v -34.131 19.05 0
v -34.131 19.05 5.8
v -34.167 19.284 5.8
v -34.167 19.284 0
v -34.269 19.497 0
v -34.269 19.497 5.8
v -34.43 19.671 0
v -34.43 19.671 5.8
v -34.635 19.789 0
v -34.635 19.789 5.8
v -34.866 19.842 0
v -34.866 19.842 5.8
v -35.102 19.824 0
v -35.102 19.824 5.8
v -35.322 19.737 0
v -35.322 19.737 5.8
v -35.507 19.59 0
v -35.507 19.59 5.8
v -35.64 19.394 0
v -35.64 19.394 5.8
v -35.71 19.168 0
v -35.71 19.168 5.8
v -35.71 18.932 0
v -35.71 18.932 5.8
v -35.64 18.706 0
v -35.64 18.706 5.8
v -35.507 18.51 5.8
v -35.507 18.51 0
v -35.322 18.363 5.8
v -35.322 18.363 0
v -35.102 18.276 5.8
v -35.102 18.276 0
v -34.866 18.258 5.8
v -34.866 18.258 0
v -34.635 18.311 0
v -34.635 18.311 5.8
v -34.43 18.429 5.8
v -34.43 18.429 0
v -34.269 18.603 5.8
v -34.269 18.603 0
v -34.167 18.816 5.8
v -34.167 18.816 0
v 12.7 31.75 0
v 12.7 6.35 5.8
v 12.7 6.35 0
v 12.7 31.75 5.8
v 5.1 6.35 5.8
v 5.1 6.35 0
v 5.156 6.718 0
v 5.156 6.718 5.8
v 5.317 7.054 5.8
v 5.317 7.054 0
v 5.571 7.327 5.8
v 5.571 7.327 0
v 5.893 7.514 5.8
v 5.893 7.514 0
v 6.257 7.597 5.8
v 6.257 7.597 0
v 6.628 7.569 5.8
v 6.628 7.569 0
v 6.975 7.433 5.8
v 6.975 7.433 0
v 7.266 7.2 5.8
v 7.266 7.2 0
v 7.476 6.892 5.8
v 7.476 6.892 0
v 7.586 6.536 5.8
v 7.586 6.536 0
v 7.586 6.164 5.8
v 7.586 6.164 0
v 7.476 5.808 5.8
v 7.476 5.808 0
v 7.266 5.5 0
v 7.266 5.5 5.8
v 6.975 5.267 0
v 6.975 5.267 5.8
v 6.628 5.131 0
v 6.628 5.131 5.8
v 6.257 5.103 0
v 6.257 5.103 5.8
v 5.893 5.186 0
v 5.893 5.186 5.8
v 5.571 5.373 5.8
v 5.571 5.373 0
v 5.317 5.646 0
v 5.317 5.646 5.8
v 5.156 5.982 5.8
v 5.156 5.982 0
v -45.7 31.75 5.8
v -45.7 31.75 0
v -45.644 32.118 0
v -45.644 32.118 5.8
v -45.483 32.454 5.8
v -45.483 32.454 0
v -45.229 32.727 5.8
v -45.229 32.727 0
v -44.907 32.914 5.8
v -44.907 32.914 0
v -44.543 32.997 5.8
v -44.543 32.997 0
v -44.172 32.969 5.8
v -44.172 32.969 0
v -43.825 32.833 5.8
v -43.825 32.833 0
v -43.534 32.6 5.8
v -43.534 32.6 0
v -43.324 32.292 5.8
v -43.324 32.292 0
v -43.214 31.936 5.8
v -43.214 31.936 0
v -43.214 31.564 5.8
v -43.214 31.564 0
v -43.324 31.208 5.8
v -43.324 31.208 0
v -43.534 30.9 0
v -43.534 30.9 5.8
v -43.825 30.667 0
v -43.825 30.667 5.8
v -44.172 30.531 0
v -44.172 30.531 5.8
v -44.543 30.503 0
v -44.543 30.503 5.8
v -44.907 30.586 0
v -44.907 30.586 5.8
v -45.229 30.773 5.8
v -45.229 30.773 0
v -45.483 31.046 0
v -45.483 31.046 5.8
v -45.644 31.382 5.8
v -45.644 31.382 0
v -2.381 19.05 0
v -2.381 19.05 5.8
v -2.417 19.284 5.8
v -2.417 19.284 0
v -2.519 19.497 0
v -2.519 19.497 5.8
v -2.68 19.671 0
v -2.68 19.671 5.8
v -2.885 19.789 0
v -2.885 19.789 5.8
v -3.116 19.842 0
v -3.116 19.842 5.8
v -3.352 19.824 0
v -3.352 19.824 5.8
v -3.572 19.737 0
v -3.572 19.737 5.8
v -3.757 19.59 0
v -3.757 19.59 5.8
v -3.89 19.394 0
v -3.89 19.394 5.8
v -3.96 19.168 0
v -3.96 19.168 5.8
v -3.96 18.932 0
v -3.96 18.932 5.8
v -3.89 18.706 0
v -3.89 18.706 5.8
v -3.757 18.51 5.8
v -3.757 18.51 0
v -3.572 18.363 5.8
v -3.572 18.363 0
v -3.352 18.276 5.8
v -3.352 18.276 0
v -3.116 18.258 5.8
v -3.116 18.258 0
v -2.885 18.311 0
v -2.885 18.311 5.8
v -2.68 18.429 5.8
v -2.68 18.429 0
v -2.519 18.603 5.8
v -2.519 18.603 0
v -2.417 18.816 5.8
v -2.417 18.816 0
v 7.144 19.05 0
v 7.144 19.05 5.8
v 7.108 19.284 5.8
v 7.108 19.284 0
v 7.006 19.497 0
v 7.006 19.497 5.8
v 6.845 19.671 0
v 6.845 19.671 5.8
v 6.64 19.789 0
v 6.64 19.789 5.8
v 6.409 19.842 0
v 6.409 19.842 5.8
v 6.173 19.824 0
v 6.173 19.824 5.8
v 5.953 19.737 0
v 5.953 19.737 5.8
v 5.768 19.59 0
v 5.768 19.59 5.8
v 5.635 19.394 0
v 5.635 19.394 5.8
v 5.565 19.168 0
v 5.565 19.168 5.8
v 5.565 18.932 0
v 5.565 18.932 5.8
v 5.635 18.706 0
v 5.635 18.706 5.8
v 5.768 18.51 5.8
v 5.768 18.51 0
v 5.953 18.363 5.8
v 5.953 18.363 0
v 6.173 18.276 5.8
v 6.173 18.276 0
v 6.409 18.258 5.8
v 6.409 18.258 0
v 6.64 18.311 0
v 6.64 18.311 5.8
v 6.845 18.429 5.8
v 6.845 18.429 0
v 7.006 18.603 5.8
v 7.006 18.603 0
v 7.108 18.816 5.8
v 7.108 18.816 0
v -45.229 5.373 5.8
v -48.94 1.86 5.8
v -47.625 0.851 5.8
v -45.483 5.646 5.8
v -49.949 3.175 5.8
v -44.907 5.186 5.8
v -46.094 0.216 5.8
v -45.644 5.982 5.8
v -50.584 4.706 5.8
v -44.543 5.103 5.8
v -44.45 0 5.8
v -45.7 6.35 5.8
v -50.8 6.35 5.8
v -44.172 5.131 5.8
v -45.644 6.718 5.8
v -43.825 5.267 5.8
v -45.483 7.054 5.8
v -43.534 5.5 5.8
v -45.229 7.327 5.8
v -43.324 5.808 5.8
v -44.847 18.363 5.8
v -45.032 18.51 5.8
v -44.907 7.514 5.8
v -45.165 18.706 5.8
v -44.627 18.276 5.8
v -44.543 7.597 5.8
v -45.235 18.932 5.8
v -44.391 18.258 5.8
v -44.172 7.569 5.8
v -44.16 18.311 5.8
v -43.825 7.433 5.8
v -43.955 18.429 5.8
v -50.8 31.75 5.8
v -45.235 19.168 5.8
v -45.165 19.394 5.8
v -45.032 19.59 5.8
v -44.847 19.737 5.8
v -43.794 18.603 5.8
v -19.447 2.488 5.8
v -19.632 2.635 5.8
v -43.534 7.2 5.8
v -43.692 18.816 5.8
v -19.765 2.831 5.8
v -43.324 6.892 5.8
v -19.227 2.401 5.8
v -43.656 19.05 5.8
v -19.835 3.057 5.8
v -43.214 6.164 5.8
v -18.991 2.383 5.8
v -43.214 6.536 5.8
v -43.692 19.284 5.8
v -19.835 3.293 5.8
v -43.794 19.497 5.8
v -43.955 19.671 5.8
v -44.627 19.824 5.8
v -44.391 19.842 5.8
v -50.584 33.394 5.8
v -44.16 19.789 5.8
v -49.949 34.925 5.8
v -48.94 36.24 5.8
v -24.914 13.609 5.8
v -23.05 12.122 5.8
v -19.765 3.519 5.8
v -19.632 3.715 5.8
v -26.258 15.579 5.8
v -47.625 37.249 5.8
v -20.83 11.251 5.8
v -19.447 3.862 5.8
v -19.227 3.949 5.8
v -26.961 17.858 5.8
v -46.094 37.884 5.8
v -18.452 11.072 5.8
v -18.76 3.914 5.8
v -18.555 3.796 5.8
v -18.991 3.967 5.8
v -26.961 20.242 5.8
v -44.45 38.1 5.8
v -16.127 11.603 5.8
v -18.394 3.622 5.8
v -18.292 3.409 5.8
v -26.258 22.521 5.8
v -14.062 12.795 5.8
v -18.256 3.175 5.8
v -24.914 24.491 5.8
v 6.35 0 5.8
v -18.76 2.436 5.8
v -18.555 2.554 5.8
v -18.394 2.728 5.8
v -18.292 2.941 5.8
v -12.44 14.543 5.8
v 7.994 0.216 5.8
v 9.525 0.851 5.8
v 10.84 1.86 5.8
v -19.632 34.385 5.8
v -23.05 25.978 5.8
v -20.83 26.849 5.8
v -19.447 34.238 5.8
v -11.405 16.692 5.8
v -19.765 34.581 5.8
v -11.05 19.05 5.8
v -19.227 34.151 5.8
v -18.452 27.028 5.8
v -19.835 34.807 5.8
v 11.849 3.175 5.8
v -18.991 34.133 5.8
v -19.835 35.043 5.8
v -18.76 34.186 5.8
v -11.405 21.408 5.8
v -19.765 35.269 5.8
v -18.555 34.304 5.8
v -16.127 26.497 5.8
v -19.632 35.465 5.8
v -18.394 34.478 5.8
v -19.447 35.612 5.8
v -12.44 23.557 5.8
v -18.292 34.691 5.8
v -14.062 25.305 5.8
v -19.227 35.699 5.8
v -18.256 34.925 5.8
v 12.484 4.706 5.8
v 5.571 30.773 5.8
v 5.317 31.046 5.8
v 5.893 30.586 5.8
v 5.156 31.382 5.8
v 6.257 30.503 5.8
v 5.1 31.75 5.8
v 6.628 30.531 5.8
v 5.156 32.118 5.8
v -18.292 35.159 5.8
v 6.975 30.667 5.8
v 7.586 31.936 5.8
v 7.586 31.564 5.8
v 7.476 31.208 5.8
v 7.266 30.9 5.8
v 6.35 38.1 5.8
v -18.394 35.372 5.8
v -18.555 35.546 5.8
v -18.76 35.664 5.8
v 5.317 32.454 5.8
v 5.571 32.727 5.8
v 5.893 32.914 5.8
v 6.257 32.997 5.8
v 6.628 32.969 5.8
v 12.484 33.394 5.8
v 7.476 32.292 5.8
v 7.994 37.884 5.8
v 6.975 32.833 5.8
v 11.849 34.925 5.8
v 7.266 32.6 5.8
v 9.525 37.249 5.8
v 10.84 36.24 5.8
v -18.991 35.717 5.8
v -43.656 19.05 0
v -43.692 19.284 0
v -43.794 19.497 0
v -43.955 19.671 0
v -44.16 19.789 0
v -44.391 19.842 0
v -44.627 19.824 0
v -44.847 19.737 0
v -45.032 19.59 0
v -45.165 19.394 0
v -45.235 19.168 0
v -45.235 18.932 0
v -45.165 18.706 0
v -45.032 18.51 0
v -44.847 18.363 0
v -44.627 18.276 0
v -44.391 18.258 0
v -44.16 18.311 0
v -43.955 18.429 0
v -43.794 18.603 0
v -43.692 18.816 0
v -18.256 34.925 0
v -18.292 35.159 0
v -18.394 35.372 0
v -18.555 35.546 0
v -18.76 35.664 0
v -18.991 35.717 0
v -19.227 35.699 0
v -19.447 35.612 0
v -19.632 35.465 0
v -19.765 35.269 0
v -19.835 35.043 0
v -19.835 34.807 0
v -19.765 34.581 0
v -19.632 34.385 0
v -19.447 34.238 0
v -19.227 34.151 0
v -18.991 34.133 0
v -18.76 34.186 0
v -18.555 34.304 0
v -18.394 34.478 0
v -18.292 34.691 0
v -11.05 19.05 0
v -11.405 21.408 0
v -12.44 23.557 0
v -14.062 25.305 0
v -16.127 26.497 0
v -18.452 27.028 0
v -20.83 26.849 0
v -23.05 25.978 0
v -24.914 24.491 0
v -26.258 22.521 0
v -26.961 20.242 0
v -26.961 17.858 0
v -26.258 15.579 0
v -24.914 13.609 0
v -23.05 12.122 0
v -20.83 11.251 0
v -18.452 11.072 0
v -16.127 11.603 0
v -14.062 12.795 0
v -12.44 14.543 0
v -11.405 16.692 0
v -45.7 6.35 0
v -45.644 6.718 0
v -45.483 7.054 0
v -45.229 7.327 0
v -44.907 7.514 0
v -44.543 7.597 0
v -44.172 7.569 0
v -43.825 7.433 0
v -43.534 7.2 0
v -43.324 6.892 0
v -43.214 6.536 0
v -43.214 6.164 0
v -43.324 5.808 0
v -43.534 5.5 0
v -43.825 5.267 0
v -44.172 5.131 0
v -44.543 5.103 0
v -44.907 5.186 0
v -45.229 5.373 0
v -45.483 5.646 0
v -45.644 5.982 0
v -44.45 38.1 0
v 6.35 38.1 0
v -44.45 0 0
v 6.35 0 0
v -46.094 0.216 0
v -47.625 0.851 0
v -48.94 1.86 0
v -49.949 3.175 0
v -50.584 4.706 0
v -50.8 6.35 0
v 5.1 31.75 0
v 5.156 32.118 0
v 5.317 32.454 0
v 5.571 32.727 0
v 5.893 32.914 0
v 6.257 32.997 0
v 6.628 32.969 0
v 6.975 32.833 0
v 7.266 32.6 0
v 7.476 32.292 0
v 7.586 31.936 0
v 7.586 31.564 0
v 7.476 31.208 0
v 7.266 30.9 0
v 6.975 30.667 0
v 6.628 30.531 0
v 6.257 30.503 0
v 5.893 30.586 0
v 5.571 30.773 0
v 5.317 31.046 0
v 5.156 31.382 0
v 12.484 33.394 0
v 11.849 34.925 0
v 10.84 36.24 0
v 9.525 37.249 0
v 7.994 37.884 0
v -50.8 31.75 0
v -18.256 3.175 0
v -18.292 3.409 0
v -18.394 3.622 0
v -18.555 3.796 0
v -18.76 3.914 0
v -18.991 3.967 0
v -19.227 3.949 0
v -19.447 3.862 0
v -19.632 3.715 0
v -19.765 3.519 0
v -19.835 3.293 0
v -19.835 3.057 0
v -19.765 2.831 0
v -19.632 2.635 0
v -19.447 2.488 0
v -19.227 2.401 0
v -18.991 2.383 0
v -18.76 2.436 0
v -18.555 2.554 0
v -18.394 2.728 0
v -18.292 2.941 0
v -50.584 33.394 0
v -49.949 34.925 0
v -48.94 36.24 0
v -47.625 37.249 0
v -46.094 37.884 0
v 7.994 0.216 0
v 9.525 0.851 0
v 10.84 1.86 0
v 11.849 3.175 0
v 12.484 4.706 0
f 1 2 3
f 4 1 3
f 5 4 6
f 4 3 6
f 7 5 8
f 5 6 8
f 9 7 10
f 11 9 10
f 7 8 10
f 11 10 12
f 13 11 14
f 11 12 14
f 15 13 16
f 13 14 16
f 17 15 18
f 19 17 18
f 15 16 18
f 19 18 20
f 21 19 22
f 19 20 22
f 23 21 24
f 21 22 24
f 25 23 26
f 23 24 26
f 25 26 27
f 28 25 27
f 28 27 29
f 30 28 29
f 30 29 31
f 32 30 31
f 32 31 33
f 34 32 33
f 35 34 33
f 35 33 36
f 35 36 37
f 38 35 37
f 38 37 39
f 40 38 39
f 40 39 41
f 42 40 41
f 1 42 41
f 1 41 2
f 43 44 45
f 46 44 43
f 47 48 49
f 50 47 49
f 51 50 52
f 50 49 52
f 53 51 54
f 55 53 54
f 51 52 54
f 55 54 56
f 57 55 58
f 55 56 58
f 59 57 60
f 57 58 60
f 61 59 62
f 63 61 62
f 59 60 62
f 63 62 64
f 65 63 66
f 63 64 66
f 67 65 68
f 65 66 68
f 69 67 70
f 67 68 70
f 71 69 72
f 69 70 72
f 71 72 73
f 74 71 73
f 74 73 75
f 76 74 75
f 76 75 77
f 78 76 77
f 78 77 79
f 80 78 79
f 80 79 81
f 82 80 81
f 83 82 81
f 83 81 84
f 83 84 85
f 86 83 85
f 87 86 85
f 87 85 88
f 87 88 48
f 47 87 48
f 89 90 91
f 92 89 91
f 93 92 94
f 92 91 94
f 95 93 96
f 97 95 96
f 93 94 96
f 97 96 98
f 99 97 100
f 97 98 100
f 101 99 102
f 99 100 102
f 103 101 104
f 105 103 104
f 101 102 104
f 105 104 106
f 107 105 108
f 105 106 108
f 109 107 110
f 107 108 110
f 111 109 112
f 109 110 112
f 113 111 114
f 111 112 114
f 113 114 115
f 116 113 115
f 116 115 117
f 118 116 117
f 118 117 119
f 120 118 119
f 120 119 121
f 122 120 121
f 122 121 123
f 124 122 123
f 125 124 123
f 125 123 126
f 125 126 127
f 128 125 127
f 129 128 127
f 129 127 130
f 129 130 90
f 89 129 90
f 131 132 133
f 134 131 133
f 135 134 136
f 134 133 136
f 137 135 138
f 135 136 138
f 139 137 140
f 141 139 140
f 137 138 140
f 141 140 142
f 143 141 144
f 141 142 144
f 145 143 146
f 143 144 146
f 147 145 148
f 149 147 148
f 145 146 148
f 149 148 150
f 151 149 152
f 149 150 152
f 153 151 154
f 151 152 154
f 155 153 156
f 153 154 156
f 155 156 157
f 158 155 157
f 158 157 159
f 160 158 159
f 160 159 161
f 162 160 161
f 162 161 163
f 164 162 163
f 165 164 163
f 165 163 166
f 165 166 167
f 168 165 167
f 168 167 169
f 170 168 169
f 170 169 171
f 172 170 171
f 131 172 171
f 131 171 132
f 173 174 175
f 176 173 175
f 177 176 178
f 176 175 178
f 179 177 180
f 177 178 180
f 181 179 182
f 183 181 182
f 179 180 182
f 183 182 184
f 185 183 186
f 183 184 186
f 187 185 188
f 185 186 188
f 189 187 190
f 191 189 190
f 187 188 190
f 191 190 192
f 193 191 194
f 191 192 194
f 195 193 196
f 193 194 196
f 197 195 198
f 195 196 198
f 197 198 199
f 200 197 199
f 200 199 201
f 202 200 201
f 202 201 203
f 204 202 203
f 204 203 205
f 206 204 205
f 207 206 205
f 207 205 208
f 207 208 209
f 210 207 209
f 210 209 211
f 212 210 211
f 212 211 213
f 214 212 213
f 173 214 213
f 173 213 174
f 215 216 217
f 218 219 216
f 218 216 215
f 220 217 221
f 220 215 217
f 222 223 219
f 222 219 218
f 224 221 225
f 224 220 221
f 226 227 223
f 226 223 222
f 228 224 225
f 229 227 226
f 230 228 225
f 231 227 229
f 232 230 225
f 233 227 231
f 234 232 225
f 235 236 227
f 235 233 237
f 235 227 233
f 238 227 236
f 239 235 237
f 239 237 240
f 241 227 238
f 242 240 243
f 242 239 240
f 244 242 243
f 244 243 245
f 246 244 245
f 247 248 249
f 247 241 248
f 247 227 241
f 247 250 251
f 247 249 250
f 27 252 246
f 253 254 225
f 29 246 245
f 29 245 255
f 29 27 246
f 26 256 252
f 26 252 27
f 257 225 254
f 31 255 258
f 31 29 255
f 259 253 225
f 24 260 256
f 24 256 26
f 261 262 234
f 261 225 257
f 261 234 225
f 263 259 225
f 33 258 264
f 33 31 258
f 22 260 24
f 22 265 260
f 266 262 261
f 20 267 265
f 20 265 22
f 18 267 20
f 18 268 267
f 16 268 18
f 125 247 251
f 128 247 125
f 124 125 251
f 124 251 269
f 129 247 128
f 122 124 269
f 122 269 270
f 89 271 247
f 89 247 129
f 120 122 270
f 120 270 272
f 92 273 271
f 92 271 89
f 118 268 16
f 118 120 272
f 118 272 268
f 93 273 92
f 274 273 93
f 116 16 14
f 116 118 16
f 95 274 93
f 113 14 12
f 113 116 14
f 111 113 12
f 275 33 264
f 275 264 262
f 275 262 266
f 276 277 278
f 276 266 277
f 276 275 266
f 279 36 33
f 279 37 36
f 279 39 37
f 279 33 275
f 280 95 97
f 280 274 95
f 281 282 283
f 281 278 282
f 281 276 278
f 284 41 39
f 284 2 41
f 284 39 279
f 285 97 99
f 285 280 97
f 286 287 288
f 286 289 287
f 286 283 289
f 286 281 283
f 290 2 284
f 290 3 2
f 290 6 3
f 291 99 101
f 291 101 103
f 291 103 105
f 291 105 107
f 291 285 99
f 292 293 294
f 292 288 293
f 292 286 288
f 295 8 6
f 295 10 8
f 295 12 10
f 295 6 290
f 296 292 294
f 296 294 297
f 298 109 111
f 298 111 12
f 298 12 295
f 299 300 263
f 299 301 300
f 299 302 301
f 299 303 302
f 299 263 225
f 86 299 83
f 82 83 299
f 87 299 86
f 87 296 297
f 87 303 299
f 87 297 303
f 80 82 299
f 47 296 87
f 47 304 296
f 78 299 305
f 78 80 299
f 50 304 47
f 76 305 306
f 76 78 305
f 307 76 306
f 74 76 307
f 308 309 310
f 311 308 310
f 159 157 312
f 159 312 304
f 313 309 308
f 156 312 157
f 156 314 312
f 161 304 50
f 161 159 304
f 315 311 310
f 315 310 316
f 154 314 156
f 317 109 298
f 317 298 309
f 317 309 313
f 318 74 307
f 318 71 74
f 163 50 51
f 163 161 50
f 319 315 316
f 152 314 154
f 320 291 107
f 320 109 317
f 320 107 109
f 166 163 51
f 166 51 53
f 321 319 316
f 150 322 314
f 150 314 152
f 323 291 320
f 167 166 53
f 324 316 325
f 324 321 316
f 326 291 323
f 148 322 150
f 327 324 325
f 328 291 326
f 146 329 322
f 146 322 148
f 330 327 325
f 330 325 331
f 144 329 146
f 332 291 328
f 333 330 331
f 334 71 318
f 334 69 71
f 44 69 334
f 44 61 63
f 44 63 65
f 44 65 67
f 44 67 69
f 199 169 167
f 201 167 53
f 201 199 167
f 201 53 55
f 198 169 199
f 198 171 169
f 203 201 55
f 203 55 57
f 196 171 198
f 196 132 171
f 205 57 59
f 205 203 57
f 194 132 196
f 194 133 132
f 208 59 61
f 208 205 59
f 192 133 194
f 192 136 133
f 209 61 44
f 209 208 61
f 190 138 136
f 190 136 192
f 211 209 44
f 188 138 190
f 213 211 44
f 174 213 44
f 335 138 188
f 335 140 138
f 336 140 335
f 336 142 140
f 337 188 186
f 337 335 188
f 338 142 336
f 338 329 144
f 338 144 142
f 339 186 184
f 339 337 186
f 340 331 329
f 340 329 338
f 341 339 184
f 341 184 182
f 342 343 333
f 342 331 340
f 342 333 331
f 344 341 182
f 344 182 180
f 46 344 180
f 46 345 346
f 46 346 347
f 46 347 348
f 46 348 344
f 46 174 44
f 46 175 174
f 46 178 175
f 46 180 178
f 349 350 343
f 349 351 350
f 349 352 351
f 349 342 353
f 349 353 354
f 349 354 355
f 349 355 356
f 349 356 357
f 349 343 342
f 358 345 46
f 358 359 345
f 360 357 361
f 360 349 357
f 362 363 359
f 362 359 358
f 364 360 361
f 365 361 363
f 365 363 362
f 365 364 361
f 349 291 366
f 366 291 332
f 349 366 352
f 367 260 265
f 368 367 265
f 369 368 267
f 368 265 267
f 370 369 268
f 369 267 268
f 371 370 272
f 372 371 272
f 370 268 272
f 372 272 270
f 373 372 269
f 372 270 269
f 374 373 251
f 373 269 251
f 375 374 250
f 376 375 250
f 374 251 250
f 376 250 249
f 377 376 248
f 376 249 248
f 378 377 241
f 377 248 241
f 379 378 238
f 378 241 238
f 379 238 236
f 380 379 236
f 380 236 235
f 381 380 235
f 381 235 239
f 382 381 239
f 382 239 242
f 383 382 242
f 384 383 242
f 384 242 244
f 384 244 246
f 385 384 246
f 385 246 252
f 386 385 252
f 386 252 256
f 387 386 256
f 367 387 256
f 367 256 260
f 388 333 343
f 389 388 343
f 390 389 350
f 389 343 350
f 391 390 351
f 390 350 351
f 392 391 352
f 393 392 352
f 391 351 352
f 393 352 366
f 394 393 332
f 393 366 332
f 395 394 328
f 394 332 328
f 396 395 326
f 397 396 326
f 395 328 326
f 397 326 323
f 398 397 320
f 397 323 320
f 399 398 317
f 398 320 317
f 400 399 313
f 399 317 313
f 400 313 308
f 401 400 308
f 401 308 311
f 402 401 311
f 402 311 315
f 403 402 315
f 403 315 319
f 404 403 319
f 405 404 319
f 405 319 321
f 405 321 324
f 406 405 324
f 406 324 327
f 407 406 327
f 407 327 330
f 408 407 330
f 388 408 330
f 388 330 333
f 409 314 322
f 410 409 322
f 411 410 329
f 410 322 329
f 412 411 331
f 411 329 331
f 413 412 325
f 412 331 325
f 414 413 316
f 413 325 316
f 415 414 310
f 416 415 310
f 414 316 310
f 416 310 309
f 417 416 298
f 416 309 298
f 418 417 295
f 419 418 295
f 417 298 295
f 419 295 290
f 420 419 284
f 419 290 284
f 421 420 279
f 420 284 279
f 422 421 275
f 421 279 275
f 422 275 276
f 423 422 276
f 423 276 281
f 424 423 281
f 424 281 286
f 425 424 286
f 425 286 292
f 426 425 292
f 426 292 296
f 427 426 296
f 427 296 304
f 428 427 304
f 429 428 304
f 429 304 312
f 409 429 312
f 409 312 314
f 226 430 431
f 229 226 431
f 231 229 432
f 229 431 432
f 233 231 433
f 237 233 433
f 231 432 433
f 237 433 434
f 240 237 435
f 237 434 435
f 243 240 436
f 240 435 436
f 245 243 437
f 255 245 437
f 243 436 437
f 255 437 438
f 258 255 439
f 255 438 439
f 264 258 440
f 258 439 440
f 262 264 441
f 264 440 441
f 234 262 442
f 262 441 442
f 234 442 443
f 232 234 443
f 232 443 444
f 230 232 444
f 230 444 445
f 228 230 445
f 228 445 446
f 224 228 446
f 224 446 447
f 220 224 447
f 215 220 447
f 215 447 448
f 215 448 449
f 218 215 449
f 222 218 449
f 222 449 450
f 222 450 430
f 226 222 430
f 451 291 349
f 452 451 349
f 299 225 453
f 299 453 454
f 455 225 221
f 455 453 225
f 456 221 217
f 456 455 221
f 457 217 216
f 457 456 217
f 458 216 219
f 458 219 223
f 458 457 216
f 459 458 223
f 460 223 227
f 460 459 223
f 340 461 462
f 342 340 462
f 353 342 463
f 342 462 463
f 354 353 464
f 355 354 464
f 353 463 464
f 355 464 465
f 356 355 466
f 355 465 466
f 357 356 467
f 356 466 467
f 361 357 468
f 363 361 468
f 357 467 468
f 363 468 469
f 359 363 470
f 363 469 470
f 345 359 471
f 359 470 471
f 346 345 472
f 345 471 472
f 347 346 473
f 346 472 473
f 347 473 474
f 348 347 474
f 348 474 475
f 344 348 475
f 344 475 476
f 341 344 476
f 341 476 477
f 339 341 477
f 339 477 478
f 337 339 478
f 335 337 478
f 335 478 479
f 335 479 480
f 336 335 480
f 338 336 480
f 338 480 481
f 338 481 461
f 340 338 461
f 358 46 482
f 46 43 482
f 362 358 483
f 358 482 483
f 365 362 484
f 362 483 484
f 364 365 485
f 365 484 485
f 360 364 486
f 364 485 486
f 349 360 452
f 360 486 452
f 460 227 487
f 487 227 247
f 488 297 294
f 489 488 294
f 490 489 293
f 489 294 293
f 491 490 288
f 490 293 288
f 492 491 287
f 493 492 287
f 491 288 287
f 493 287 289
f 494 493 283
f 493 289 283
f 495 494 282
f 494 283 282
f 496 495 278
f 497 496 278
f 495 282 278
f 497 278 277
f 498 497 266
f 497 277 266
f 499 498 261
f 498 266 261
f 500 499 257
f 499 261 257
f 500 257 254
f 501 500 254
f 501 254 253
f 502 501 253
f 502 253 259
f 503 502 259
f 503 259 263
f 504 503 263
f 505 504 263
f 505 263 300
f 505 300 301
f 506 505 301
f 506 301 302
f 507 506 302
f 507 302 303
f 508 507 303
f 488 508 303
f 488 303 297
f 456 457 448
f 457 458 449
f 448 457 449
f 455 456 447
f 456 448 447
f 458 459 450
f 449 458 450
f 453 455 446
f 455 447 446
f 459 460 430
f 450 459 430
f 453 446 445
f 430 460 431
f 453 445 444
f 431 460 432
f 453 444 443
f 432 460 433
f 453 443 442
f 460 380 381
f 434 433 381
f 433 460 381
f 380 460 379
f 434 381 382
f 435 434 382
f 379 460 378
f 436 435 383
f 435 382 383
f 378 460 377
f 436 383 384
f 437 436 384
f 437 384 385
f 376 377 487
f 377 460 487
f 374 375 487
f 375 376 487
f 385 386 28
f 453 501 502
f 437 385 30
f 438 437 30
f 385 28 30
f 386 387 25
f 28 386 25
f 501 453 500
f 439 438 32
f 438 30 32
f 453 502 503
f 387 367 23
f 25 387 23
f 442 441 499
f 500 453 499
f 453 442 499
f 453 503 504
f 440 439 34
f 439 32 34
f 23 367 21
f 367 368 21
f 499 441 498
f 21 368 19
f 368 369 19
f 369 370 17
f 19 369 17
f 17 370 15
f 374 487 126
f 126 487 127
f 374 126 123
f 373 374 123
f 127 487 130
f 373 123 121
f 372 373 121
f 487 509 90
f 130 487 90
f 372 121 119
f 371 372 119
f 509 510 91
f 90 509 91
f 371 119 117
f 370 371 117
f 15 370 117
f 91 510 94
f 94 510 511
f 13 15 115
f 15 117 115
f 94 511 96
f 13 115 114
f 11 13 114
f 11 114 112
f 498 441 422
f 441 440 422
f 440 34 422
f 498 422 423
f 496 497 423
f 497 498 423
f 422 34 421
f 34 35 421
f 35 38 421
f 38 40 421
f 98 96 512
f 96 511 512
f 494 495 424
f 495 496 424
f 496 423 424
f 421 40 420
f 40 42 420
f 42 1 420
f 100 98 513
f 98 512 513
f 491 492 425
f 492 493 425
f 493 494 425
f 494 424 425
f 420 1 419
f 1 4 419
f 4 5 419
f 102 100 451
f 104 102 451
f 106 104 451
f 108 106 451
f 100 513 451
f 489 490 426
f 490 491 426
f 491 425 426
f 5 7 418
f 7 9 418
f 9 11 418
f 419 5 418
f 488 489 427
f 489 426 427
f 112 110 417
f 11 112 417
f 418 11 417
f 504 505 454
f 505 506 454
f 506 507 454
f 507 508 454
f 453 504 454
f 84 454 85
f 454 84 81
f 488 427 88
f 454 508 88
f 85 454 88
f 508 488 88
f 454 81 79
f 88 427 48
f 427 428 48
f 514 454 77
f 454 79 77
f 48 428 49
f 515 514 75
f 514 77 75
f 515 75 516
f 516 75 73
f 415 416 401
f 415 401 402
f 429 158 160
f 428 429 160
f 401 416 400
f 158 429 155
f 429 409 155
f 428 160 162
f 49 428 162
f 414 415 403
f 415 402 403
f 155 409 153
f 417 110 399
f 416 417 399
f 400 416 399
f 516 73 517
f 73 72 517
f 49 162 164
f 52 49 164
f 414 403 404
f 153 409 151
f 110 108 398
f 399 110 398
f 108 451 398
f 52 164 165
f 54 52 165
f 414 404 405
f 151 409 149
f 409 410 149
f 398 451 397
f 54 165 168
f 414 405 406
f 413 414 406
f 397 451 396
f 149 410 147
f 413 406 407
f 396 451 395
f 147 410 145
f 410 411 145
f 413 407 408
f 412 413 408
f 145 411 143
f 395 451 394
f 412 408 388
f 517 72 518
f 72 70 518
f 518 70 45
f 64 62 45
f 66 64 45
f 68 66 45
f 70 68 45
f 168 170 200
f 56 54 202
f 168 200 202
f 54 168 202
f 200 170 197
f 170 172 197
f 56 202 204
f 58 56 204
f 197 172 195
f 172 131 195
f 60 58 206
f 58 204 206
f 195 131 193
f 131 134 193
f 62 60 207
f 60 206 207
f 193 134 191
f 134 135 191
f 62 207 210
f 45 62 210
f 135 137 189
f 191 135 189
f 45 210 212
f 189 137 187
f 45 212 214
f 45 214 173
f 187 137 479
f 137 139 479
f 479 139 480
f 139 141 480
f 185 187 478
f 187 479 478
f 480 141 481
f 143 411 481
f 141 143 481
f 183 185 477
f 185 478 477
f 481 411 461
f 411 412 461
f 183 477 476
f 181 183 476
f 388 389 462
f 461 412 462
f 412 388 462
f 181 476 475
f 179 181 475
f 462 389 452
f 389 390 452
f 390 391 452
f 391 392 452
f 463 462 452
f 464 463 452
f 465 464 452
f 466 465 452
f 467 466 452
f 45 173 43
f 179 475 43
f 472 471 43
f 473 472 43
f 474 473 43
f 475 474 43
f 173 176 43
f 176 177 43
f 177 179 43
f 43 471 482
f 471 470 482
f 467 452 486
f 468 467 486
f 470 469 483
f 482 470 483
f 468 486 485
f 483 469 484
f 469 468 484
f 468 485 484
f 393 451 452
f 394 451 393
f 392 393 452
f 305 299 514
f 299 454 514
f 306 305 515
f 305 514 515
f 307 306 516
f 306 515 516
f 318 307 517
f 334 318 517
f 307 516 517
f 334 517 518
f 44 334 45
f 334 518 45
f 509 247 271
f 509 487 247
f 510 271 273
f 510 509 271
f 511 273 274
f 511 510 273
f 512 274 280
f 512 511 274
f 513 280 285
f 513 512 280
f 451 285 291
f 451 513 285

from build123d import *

# Parameters (mm, degrees)
SKETCH1_W                 = 38.1
SKETCH1_H                 = 38.1
BOSS_EXTRUDE1_DEPTH       = 5.8
SKETCH2_R                 = 8
CUT_EXTRUDE1_DEPTH        = 12.7
SKETCH4_R                 = 0.79375
CUT_EXTRUDE3_DEPTH        = 55.19280395
SKETCH6_W                 = 12.7
SKETCH6_H                 = 38.1
BOSS_EXTRUDE2_DEPTH       = 5.8
M3X0_5_TAPPED_HOLE1_D     = 2.5
M3X0_5_TAPPED_HOLE1_DEPTH = 7.5
M3X0_5_TAPPED_HOLE1_TIP   = 0.751075774
SKETCH9_R                 = 0.79375
CUT_EXTRUDE4_DEPTH        = 64.764331722
FILLET1_R                 = 6.35


with BuildPart() as part:
    # Sketch1 → Boss-Extrude1 (new body)
    with BuildSketch(Plane.XY):
        with Locations((-19.05, 19.05)):
            Rectangle(SKETCH1_W, SKETCH1_H)
    extrude(amount=BOSS_EXTRUDE1_DEPTH)

    # Sketch2 → Cut-Extrude1 (cut)
    with BuildSketch(Plane.XY.offset(5.8)):
        with Locations((-19.05, 19.05)):
            Circle(SKETCH2_R)
    extrude(amount=-CUT_EXTRUDE1_DEPTH, mode=Mode.SUBTRACT)

    # Sketch4 → Cut-Extrude3 (cut, through all)
    with BuildSketch(Plane.XY.offset(5.8)):
        with Locations((-34.925, 19.05)):
            Circle(SKETCH4_R)
        with Locations((-19.05, 34.925)):
            Circle(SKETCH4_R)
        with Locations((-3.175, 19.05)):
            Circle(SKETCH4_R)
        with Locations((-19.05, 3.175)):
            Circle(SKETCH4_R)
    extrude(amount=-CUT_EXTRUDE3_DEPTH, mode=Mode.SUBTRACT)

    # Sketch6 → Boss-Extrude2 (add, through all)
    with BuildSketch(Plane.XY.offset(5.8)):
        with Locations((6.35, 19.05)):
            Rectangle(SKETCH6_W, SKETCH6_H)
        with Locations((-44.45, 19.05)):
            Rectangle(SKETCH6_W, SKETCH6_H)
    extrude(amount=-BOSS_EXTRUDE2_DEPTH)

    # M3x0.5 Tapped Hole1
    with Locations(Plane.XY.offset(5.8)):
        with Locations((-44.45, 31.75), (6.35, 31.75), (6.35, 6.35), (-44.45, 6.35)):
            Hole(M3X0_5_TAPPED_HOLE1_D / 2, depth=M3X0_5_TAPPED_HOLE1_DEPTH)
            with Locations((0, 0, -(M3X0_5_TAPPED_HOLE1_DEPTH + M3X0_5_TAPPED_HOLE1_TIP / 2))):  # 118° drill point
                Cone(0, M3X0_5_TAPPED_HOLE1_D / 2, M3X0_5_TAPPED_HOLE1_TIP, mode=Mode.SUBTRACT)

    # Sketch9 → Cut-Extrude4 (cut, through all)
    with BuildSketch(Plane.XY.offset(5.8)):
        with Locations((-44.45, 19.05)):
            Circle(SKETCH9_R)
        with Locations((6.35, 19.05)):
            Circle(SKETCH9_R)
    extrude(amount=-CUT_EXTRUDE4_DEPTH, mode=Mode.SUBTRACT)

    # Fillet1
    fillet1_edges = [part.edges().sort_by_distance(p)[0] for p in [
        (12.7, 38.1, 2.9),
        (12.7, 0, 2.9),
        (-50.8, 0, 2.9),
        (-50.8, 38.1, 2.9),
    ]]
    fillet(fillet1_edges, radius=FILLET1_R)


solid = part.part
